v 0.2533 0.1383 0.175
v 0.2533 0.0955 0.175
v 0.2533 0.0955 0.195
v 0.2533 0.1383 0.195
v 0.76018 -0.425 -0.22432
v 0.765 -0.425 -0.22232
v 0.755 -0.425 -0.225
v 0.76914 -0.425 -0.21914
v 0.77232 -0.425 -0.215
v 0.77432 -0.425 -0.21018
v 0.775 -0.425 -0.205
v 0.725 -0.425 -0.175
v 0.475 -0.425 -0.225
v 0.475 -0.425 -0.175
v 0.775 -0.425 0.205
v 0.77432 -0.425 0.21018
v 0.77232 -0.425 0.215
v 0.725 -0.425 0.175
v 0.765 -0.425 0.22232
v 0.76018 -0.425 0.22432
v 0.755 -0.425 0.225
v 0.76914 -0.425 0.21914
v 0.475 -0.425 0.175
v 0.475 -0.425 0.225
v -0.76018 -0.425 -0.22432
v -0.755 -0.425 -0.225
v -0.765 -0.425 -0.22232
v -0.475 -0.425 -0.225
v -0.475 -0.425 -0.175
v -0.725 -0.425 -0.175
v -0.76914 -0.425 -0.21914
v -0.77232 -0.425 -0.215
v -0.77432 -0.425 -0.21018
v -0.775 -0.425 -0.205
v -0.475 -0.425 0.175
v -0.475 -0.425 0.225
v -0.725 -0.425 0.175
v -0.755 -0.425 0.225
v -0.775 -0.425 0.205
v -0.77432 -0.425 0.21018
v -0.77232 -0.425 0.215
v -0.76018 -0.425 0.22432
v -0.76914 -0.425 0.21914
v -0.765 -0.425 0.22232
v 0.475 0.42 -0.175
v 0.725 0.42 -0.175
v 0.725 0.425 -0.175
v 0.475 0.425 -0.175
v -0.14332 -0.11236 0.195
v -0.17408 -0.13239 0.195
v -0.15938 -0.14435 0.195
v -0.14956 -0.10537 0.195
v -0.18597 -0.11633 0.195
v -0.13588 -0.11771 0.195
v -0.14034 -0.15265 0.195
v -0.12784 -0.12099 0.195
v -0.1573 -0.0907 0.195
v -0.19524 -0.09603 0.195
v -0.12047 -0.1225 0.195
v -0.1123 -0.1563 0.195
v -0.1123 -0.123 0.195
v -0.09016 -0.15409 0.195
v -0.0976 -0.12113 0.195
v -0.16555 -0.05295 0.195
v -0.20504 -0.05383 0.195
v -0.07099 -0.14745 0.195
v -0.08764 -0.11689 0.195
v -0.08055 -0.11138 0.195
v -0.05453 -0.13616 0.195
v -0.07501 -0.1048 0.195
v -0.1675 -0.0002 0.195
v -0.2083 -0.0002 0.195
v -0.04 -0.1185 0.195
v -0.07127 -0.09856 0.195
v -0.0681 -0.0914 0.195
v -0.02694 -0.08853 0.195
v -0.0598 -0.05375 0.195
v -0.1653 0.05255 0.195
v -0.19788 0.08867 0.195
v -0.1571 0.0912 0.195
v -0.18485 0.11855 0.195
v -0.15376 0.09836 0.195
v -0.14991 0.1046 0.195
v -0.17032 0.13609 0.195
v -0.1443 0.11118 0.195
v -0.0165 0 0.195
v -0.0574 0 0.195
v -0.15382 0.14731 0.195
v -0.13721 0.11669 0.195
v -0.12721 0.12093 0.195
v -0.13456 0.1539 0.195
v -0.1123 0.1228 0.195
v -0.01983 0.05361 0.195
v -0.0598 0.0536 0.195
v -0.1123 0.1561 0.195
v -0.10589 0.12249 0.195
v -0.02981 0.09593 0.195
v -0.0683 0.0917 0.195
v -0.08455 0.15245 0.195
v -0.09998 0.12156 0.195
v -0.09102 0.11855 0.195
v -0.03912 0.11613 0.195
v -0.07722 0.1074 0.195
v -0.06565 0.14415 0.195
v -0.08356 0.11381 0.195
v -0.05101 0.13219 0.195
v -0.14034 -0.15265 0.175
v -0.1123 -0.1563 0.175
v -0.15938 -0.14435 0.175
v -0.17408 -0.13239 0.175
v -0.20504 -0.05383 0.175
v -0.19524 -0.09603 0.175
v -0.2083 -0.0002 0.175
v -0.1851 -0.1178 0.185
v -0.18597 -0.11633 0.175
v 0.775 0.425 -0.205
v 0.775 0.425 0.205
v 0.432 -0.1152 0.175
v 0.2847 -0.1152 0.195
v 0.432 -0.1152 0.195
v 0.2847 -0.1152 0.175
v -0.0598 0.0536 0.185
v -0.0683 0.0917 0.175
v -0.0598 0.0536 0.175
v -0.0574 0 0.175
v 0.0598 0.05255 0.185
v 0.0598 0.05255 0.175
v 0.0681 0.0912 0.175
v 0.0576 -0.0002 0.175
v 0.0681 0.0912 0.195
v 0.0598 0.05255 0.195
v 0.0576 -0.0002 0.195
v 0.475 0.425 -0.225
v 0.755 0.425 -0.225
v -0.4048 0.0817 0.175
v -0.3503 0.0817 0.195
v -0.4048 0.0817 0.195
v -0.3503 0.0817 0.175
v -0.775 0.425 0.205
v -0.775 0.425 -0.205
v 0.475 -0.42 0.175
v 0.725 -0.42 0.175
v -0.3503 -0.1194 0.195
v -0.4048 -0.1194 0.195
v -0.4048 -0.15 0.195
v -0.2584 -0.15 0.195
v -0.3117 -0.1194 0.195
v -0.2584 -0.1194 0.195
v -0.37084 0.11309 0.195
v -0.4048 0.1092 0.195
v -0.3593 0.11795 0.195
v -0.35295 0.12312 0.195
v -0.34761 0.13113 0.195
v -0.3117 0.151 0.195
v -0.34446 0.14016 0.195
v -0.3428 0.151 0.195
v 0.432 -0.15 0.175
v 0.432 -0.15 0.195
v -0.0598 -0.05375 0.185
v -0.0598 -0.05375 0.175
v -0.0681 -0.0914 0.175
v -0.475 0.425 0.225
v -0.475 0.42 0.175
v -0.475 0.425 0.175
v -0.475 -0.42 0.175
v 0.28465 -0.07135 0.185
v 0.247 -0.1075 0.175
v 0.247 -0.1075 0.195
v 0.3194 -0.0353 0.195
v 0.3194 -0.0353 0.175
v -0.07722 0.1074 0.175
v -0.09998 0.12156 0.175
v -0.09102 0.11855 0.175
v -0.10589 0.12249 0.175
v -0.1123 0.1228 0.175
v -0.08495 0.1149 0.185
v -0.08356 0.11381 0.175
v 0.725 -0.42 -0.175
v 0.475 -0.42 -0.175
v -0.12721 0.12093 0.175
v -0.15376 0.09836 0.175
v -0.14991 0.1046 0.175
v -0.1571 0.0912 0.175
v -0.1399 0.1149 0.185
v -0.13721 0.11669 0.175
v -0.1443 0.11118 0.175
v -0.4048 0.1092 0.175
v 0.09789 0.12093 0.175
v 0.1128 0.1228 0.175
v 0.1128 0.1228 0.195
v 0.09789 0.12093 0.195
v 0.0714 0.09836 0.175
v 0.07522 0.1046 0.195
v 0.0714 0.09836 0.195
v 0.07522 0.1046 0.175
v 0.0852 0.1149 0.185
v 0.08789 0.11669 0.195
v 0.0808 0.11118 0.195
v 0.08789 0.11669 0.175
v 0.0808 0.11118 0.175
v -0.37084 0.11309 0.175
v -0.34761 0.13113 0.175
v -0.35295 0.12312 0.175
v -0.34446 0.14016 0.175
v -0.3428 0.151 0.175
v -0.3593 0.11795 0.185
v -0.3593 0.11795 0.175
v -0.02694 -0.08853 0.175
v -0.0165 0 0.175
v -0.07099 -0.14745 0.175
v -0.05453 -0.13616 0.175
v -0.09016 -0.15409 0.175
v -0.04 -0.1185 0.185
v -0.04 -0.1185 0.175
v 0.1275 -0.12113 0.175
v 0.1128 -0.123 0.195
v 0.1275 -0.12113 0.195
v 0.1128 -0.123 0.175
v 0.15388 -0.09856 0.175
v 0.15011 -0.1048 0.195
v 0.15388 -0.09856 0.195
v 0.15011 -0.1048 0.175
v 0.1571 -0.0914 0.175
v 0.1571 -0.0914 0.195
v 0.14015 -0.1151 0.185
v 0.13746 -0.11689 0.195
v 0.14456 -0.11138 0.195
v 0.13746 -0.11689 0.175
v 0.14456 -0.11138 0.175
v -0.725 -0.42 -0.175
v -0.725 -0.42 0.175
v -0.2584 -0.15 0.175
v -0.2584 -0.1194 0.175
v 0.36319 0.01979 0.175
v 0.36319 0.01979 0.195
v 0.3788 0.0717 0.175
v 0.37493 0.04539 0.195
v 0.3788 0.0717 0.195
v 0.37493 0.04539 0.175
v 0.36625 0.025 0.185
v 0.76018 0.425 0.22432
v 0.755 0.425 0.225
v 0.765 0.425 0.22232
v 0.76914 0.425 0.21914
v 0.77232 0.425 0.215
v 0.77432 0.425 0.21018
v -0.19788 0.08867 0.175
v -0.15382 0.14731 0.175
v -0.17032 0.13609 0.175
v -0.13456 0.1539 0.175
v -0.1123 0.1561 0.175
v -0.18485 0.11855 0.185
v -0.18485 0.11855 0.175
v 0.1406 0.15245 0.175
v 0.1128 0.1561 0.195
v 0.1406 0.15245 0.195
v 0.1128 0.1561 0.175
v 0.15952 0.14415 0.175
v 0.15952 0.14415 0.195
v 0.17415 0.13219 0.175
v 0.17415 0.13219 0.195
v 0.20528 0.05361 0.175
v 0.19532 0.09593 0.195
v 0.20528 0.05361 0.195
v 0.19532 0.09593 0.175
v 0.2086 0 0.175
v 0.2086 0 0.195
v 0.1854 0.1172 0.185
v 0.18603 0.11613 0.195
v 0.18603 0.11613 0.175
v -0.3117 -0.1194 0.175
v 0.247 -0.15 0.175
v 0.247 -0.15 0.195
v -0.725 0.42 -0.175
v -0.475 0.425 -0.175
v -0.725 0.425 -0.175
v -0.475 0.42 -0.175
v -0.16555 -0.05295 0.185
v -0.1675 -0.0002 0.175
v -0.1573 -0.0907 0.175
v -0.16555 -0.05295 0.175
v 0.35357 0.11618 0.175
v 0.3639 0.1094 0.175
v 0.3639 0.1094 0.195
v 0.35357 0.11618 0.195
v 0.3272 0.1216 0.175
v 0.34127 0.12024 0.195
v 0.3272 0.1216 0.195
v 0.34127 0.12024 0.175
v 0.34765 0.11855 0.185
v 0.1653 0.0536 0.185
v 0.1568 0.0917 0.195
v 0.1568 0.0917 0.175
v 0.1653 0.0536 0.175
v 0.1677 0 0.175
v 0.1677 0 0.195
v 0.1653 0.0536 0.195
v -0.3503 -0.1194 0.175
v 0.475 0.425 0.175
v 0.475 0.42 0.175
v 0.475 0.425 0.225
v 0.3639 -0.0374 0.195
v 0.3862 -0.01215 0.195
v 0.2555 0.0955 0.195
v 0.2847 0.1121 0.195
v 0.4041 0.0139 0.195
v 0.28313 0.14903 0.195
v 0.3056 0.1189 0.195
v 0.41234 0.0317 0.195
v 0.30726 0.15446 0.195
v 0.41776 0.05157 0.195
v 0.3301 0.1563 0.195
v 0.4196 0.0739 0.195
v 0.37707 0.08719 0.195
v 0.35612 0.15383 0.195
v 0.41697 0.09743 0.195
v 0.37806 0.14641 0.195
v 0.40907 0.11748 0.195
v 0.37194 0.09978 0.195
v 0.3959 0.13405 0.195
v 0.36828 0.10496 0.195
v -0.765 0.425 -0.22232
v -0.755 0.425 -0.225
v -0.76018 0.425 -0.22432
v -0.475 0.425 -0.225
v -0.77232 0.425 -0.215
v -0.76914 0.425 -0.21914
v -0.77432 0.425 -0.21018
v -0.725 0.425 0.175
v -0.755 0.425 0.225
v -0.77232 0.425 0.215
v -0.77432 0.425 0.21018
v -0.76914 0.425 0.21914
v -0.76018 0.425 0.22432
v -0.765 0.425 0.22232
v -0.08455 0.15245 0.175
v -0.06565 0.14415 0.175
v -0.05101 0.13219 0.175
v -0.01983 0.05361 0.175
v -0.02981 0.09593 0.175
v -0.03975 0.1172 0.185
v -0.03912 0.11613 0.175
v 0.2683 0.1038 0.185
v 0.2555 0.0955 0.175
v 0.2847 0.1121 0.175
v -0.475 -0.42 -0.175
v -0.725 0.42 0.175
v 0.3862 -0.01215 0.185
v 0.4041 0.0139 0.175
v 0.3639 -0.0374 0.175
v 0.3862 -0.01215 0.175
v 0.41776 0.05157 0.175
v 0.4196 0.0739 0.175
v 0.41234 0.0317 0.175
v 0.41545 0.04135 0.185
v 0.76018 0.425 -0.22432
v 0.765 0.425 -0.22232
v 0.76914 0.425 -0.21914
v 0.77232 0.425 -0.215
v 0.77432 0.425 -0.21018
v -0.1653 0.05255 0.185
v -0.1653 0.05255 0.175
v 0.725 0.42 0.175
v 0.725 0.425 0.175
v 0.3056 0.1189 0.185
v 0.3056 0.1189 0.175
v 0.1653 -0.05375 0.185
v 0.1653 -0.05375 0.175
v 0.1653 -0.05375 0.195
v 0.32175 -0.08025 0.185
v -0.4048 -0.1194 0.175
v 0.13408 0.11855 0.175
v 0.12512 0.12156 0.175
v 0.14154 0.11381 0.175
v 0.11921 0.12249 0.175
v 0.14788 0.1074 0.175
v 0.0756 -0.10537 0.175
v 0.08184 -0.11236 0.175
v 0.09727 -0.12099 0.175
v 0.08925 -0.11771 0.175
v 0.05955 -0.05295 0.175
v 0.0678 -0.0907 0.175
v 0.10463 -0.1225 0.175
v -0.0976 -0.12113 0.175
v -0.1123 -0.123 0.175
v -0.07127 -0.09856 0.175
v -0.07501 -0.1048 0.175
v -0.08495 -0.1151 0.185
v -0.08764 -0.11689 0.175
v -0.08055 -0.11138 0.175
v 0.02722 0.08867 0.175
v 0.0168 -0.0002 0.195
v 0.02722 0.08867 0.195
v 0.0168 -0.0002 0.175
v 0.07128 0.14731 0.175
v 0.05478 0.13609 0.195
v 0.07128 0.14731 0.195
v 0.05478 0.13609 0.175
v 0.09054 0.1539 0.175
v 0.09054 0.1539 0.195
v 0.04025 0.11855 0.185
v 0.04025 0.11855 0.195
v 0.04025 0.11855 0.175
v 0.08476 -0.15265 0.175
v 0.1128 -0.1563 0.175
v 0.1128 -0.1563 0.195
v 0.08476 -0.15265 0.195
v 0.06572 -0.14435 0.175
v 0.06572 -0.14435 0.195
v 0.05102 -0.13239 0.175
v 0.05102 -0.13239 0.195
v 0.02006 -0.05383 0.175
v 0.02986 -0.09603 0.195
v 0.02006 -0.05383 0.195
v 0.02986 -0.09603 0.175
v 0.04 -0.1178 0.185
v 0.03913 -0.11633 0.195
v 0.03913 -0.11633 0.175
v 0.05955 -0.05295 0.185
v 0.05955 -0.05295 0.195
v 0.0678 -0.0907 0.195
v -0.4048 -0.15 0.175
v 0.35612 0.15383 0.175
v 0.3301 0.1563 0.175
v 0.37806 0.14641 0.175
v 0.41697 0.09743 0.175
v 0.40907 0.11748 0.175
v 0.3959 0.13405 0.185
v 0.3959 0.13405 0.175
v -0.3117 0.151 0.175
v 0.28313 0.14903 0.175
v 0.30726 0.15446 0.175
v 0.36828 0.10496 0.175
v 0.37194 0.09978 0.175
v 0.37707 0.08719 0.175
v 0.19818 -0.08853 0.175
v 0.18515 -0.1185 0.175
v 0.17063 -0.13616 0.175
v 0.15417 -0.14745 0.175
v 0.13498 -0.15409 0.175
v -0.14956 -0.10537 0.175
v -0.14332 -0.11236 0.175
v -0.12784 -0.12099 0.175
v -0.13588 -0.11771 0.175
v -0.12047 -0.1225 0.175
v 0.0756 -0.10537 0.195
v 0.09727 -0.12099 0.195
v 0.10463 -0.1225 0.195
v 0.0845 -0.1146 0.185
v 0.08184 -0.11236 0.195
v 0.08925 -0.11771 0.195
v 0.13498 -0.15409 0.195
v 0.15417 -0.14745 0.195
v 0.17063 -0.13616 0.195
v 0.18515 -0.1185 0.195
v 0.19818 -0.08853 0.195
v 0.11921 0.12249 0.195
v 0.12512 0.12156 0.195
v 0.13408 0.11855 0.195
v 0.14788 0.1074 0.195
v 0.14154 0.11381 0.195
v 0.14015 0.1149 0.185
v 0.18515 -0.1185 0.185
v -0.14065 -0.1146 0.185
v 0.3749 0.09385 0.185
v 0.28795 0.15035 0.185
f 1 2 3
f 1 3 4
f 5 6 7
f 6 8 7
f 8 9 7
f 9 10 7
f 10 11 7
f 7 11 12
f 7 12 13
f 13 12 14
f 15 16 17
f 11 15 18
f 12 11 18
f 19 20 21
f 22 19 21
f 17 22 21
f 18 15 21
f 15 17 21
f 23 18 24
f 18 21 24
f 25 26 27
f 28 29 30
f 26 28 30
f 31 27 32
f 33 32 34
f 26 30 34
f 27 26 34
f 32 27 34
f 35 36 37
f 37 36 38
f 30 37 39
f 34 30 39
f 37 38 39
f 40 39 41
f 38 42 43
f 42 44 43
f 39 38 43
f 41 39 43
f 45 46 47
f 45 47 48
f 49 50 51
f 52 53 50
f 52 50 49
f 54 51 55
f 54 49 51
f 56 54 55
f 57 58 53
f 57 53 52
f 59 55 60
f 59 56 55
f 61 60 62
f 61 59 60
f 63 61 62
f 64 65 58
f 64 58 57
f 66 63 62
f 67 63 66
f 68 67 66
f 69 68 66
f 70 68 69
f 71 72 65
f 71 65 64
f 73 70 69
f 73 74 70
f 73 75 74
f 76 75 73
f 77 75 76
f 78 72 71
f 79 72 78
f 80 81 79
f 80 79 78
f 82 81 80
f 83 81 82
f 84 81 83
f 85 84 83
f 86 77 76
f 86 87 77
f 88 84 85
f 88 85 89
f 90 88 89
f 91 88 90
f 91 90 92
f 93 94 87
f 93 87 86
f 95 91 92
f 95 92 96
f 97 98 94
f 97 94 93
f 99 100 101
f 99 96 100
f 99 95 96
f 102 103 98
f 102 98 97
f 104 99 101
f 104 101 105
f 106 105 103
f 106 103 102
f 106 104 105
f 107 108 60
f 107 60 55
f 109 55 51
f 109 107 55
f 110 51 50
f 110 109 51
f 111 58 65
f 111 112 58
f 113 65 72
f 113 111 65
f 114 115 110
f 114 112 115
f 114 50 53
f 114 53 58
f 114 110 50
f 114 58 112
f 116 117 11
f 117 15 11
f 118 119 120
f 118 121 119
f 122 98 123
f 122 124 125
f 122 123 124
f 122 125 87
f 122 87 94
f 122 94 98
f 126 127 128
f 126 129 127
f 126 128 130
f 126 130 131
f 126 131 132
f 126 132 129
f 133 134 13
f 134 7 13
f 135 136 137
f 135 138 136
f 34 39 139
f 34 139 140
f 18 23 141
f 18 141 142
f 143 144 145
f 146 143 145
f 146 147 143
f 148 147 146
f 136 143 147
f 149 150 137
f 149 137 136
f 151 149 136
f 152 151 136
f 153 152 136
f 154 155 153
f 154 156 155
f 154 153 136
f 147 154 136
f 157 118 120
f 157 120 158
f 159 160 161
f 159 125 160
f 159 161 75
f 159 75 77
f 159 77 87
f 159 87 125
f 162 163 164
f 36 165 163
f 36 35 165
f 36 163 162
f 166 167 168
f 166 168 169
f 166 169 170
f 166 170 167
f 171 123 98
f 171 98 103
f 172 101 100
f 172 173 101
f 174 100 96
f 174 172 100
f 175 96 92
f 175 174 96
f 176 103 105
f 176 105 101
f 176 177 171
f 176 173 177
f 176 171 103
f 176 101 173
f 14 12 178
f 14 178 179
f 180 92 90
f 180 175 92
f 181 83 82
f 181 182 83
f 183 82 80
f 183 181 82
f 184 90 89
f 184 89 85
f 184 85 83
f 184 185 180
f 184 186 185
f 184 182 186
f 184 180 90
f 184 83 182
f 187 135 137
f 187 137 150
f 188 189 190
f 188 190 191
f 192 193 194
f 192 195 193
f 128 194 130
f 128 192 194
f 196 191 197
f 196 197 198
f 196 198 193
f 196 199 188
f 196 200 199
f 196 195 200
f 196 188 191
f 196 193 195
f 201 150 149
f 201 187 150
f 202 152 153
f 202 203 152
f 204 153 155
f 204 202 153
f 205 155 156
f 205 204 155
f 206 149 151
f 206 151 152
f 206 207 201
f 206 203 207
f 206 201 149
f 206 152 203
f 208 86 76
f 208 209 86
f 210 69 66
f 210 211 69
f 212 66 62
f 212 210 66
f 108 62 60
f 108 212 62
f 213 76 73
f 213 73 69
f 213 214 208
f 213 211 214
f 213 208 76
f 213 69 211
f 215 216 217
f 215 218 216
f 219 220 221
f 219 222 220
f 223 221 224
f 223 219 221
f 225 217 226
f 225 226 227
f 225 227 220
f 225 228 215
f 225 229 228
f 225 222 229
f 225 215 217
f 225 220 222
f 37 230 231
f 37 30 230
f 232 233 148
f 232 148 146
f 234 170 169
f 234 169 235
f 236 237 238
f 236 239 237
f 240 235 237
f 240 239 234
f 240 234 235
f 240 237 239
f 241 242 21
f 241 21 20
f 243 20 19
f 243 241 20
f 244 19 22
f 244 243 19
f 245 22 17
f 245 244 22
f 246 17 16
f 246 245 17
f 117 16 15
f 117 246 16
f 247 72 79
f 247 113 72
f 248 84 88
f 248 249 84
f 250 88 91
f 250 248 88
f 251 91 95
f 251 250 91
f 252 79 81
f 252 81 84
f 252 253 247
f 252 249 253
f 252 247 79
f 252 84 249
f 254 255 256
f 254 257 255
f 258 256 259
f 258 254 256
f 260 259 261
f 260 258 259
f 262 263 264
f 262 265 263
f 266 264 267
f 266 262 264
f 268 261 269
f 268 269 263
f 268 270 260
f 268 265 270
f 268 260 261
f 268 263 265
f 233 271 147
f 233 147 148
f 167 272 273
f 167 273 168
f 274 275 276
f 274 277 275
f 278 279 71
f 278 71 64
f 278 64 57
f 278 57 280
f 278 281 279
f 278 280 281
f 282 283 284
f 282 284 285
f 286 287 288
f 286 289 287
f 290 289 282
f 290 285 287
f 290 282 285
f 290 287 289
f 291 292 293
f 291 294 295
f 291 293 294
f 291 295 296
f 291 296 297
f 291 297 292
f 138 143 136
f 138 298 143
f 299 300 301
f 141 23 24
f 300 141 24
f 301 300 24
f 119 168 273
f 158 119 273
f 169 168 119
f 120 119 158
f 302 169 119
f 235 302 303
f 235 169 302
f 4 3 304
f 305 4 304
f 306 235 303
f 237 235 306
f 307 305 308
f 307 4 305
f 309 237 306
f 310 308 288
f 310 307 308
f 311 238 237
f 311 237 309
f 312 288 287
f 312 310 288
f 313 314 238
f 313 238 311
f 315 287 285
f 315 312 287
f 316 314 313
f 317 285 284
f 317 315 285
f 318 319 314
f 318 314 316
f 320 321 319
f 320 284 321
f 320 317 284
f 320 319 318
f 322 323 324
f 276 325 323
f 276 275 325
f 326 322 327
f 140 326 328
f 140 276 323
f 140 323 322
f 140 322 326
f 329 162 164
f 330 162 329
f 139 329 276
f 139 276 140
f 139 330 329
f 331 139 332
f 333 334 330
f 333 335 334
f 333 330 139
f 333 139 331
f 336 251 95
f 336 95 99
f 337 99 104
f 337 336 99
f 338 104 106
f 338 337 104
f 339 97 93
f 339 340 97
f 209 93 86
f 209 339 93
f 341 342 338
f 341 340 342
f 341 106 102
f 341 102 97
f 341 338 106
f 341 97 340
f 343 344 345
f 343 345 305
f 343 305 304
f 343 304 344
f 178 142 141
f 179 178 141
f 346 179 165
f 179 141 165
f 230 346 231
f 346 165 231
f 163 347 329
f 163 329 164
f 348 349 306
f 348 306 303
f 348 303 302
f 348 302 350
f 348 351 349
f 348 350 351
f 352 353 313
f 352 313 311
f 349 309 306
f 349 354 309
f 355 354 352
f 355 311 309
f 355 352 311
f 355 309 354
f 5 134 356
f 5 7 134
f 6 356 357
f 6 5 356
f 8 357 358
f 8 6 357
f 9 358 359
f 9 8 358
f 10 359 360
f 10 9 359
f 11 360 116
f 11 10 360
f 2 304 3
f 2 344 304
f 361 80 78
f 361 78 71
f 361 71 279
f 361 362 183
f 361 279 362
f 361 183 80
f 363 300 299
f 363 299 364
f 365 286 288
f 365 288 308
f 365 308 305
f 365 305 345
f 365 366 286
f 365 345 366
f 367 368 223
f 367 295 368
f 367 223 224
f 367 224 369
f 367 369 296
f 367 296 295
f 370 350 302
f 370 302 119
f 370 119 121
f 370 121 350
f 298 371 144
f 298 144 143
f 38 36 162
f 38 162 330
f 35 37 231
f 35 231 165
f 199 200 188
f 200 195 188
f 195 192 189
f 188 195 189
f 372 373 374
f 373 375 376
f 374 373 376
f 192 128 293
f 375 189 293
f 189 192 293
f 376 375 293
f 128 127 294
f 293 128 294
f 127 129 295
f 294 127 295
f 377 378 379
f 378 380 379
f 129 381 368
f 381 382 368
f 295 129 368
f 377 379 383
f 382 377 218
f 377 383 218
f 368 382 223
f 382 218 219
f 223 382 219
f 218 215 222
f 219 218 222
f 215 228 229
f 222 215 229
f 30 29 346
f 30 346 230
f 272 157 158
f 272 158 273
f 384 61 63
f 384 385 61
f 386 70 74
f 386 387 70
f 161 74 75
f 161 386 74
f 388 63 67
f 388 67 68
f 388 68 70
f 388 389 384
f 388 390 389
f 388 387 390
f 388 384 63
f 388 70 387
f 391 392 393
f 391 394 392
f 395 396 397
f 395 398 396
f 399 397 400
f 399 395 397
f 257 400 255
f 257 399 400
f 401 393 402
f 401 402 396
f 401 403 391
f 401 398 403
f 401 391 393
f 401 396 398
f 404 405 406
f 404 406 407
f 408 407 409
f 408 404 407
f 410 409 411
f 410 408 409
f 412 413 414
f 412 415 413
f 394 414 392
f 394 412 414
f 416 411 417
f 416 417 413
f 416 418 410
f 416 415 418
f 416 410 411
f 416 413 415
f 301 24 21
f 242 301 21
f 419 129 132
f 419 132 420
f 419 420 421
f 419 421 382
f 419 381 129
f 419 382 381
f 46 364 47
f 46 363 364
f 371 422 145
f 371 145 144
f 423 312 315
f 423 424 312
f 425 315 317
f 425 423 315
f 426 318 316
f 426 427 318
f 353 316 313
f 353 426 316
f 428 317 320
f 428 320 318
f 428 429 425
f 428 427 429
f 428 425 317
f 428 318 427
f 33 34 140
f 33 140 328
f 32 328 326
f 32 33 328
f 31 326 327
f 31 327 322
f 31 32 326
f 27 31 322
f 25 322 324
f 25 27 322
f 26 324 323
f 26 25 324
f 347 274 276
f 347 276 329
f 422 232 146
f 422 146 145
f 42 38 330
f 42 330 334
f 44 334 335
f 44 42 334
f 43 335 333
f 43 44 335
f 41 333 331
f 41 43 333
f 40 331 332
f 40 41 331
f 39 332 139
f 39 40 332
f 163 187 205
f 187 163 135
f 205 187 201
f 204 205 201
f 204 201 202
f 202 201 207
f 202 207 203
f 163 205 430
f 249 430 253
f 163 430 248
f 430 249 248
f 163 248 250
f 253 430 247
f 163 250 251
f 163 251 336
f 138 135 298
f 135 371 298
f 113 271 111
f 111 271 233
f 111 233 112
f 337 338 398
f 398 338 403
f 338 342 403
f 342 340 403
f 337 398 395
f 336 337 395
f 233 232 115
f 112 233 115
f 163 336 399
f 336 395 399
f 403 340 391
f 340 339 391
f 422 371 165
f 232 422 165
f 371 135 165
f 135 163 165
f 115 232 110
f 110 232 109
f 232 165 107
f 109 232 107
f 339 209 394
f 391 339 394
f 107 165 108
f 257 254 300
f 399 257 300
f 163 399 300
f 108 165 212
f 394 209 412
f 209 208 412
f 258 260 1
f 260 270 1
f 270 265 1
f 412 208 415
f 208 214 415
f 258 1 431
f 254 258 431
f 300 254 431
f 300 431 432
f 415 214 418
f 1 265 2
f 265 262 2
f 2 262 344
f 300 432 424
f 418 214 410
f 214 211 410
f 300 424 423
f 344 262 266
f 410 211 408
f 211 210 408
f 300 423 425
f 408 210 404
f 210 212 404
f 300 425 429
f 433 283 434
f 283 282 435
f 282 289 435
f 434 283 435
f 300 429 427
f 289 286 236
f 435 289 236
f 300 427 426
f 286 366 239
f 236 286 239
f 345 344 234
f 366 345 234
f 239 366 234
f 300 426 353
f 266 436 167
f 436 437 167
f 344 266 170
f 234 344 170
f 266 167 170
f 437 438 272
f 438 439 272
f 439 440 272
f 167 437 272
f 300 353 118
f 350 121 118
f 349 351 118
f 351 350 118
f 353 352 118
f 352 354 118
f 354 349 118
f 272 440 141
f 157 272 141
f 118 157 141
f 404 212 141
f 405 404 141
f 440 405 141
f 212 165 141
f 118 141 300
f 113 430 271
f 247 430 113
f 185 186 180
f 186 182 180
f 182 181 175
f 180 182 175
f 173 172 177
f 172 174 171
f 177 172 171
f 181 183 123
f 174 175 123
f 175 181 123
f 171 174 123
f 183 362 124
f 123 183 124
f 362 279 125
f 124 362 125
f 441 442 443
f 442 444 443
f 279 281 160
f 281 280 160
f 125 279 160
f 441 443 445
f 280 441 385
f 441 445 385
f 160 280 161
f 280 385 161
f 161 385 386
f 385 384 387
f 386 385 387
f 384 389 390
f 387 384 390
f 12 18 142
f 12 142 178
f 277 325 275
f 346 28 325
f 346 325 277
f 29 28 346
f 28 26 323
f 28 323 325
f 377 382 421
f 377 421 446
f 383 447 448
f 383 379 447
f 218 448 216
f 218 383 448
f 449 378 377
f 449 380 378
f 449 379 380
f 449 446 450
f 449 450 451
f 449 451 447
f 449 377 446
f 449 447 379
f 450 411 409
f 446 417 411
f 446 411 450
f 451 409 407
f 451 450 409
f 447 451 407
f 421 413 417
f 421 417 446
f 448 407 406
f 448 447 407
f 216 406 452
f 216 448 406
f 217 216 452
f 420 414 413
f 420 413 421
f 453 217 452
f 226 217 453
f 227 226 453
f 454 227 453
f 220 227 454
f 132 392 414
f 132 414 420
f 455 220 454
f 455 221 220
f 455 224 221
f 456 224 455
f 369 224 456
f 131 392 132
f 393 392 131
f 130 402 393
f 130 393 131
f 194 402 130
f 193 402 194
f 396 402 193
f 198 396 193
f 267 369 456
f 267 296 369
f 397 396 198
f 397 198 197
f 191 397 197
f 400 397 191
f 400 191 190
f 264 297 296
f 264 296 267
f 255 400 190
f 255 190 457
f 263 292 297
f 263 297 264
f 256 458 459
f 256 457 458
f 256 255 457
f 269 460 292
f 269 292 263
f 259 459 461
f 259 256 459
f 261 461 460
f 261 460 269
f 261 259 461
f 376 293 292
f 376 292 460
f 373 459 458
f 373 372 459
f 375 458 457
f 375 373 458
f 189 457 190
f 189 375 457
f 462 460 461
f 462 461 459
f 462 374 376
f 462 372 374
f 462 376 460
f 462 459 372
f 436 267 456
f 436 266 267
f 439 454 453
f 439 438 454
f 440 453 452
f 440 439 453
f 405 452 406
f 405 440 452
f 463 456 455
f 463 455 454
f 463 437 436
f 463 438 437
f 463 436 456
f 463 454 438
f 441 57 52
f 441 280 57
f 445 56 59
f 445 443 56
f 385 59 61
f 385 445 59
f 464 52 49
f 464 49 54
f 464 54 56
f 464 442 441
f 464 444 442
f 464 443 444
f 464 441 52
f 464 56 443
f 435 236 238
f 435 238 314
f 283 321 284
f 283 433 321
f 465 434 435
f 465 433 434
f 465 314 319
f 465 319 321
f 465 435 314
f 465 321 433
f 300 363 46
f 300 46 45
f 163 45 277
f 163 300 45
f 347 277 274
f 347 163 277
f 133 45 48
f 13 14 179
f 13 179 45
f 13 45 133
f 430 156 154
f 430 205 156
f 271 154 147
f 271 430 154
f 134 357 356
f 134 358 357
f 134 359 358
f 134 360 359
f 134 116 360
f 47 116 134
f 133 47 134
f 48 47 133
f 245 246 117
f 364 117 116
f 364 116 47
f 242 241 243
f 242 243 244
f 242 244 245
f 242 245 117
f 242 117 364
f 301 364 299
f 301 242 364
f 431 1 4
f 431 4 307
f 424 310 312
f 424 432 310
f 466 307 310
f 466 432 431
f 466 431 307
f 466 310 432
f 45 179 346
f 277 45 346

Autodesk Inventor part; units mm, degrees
ref_plane "YZ Plane" through (0, 0, 0) normal (1, 0, 0) x (0, 1, 0)
ref_plane "XZ Plane" through (0, 0, 0) normal (0, 1, 0) x (-1, 0, 0)
ref_plane "XY Plane" through (0, 0, 0) normal (0, 0, 1) x (1, 0, 0)
sketch "Sketch1" plane through (0, 0, 0) normal (0, 1, 0) x (-1, 0, 0)
  line L0 (0.725, 0.175) -> (-0.725, 0.175)
  line L1 (-0.725, 0.175) -> (-0.725, -0.175)
  line L2 (-0.725, -0.175) -> (0.725, -0.175)
  line L3 (0.725, -0.175) -> (0.725, 0.175)
  line L4 (0.475, 0.175) -> (0.475, 0.225)
  line L5 (0.475, 0.225) -> (0.775, 0.225)
  line L6 (0.775, 0.225) -> (0.775, -0.225)
  line L7 (0.775, -0.225) -> (0.475, -0.225)
  line L8 (0.475, -0.225) -> (0.475, -0.175)
  line L9 (-0.475, 0.175) -> (-0.475, 0.225)
  line L10 (-0.475, 0.225) -> (-0.775, 0.225)
  line L11 (-0.775, 0.225) -> (-0.775, -0.225)
  line L12 (-0.775, -0.225) -> (-0.475, -0.225)
  line L13 (-0.475, -0.175) -> (-0.475, -0.225)
  line L14 (0.475, 0.175) -> (-0.475, 0.175)
  point P0 (0, 0)
  point P1 (0, 0.175)
  point P2 (0.725, 0)
  dimension "d0" = 1.55
  dimension "d1" = 0.05
  dimension "d2" = 0.05
  dimension "d3" = 0.45
  dimension "d4" = 0.3
extrude "Extrusion1" add sketch "Sketch1" along normal mid plane 0.85 contours L0 L4 L5 L6 L7 L8 L2 L3 | L0 L1 L2 L13 L12 L11 L10 L9
extrude "Extrusion2" add sketch "Sketch1" along normal mid plane 0.84 contours L3 L2 L1 L0
sketch "Sketch2" plane through (-0.475, -0.42, 0.175) normal (0, 0, 1) x (1, 0, 0)
  line L0 (0, 0) -> (0, 0.84) projected
  line L1 (0.95, 0) -> (0, 0) projected
  line L2 (0.95, 0) -> (0.95, 0.84) projected
  line L3 (0, 0.84) -> (0.95, 0.84) projected
  line L4 (0, 0.42) -> (0.95, 0.42) construction
  line L5 (0.2166, 0.27) -> (0.0702, 0.27)
  line L6 (0.0702, 0.27) -> (0.0702, 0.3006)
  line L7 (0.0702, 0.3006) -> (0.1247, 0.3006)
  line L8 (0.1247, 0.3006) -> (0.1247, 0.5017)
  line L9 (0.1247, 0.5017) -> (0.0702, 0.5017)
  line L10 (0.0702, 0.5017) -> (0.0702, 0.5292)
  spline S0 degree 2 poles (0.0702, 0.5292) (0.1011, 0.5292) (0.1303, 0.5467) (0.1322, 0.571) knots 0 0 0 1 2 2 2
  line L11 (0.1322, 0.571) -> (0.1633, 0.571)
  line L12 (0.1633, 0.571) -> (0.1633, 0.3006)
  line L13 (0.1633, 0.3006) -> (0.2166, 0.3006)
  line L14 (0.2166, 0.3006) -> (0.2166, 0.27)
  spline S1 degree 2 poles (0.4585, 0.42) (0.4585, 0.3393) (0.4115, 0.2637) (0.3627, 0.2637) knots 0 0 0 1 2 2 2
  spline S2 degree 2 poles (0.3627, 0.2637) (0.3131, 0.2637) (0.2667, 0.3407) (0.2667, 0.4198) knots 0 0 0 1 2 2 2
  spline S3 degree 2 poles (0.2667, 0.4198) (0.2667, 0.501) (0.3136, 0.5761) (0.3627, 0.5761) knots 0 0 0 1 2 2 2
  spline S4 degree 2 poles (0.3627, 0.5761) (0.412, 0.5761) (0.4585, 0.4983) (0.4585, 0.42) knots 0 0 0 1 2 2 2
  spline S5 degree 2 poles (0.4069, 0.3286) (0.4128, 0.3434) (0.4176, 0.3891) (0.4176, 0.42) knots 0 0 0 1 2 2 2
  spline S6 degree 2 poles (0.4176, 0.42) (0.4176, 0.4509) (0.4128, 0.4963) (0.4067, 0.5117) knots 0 0 0 1 2 2 2
  spline S7 degree 2 poles (0.4067, 0.5117) (0.4006, 0.527) (0.3795, 0.5428) (0.3627, 0.5428) knots 0 0 0 1 2 2 2
  spline S8 degree 2 poles (0.3627, 0.5428) (0.3459, 0.5428) (0.3243, 0.527) (0.3179, 0.5112) knots 0 0 0 1 2 2 2
  spline S9 degree 2 poles (0.3179, 0.5112) (0.3119, 0.4959) (0.3075, 0.4492) (0.3075, 0.4198) knots 0 0 0 1 2 2 2
  spline S10 degree 2 poles (0.3075, 0.4198) (0.3075, 0.3882) (0.3114, 0.3459) (0.3177, 0.3293) knots 0 0 0 1 2 2 2
  spline S11 degree 2 poles (0.3177, 0.3293) (0.3235, 0.3138) (0.3452, 0.297) (0.3627, 0.297) knots 0 0 0 1 2 2 2
  spline S12 degree 2 poles (0.3627, 0.297) (0.3792, 0.297) (0.4009, 0.3128) (0.4069, 0.3286) knots 0 0 0 1 2 2 2
  spline S13 degree 2 poles (0.6836, 0.42) (0.6836, 0.3393) (0.6367, 0.2637) (0.5878, 0.2637) knots 0 0 0 1 2 2 2
  spline S14 degree 2 poles (0.5878, 0.2637) (0.5382, 0.2637) (0.4918, 0.3407) (0.4918, 0.4198) knots 0 0 0 1 2 2 2
  spline S15 degree 2 poles (0.4918, 0.4198) (0.4918, 0.501) (0.5387, 0.5761) (0.5878, 0.5761) knots 0 0 0 1 2 2 2
  spline S16 degree 2 poles (0.5878, 0.5761) (0.6372, 0.5761) (0.6836, 0.4983) (0.6836, 0.42) knots 0 0 0 1 2 2 2
  spline S17 degree 2 poles (0.6321, 0.3286) (0.6379, 0.3434) (0.6427, 0.3891) (0.6427, 0.42) knots 0 0 0 1 2 2 2
  spline S18 degree 2 poles (0.6427, 0.42) (0.6427, 0.4509) (0.6379, 0.4963) (0.6318, 0.5117) knots 0 0 0 1 2 2 2
  spline S19 degree 2 poles (0.6318, 0.5117) (0.6257, 0.527) (0.6046, 0.5428) (0.5878, 0.5428) knots 0 0 0 1 2 2 2
  spline S20 degree 2 poles (0.5878, 0.5428) (0.571, 0.5428) (0.5494, 0.527) (0.5431, 0.5112) knots 0 0 0 1 2 2 2
  spline S21 degree 2 poles (0.5431, 0.5112) (0.537, 0.4959) (0.5326, 0.4492) (0.5326, 0.4198) knots 0 0 0 1 2 2 2
  spline S22 degree 2 poles (0.5326, 0.4198) (0.5326, 0.3882) (0.5365, 0.3459) (0.5428, 0.3293) knots 0 0 0 1 2 2 2
  spline S23 degree 2 poles (0.5428, 0.3293) (0.5487, 0.3138) (0.5703, 0.297) (0.5878, 0.297) knots 0 0 0 1 2 2 2
  spline S24 degree 2 poles (0.5878, 0.297) (0.6043, 0.297) (0.626, 0.3128) (0.6321, 0.3286) knots 0 0 0 1 2 2 2
  line L15 (0.907, 0.27) -> (0.722, 0.27)
  line L16 (0.722, 0.27) -> (0.722, 0.3125)
  spline S25 degree 2 poles (0.722, 0.3125) (0.7419, 0.3313) (0.7774, 0.366) (0.7944, 0.3847) knots 0 0 0 1 2 2 2
  spline S26 degree 2 poles (0.7944, 0.3847) (0.8287, 0.4224) (0.8538, 0.4676) (0.8538, 0.4917) knots 0 0 0 1 2 2 2
  spline S27 degree 2 poles (0.8538, 0.4917) (0.8538, 0.5044) (0.846, 0.5233) (0.8389, 0.5294) knots 0 0 0 1 2 2 2
  spline S28 degree 2 poles (0.8389, 0.5294) (0.8319, 0.5355) (0.8134, 0.5416) (0.8022, 0.5416) knots 0 0 0 1 2 2 2
  spline S29 degree 2 poles (0.8022, 0.5416) (0.7915, 0.5416) (0.7697, 0.5362) (0.7597, 0.5321) knots 0 0 0 1 2 2 2
  spline S30 degree 2 poles (0.7597, 0.5321) (0.7512, 0.5287) (0.7354, 0.5189) (0.7305, 0.5155) knots 0 0 0 1 2 2 2
  line L17 (0.7305, 0.5155) -> (0.7283, 0.5155)
  line L18 (0.7283, 0.5155) -> (0.7283, 0.5583)
  spline S31 degree 2 poles (0.7283, 0.5583) (0.7407, 0.5644) (0.7852, 0.5763) (0.8051, 0.5763) knots 0 0 0 1 2 2 2
  spline S32 degree 2 poles (0.8051, 0.5763) (0.8472, 0.5763) (0.8946, 0.5318) (0.8946, 0.4939) knots 0 0 0 1 2 2 2
  spline S33 degree 2 poles (0.8946, 0.4939) (0.8946, 0.4762) (0.8863, 0.4465) (0.8791, 0.4339) knots 0 0 0 1 2 2 2
  spline S34 degree 2 poles (0.8791, 0.4339) (0.8718, 0.4207) (0.8506, 0.395) (0.8389, 0.3826) knots 0 0 0 1 2 2 2
  spline S35 degree 2 poles (0.8389, 0.3826) (0.82, 0.3619) (0.7735, 0.3176) (0.7597, 0.3048) knots 0 0 0 1 2 2 2
  line L19 (0.7597, 0.3048) -> (0.907, 0.3048)
  line L20 (0.907, 0.3048) -> (0.907, 0.27)
  point P0 (0.475, 0.42)
extrude "Extrusion3" add sketch "Sketch2" along normal blind 0.02 contours L5 L6 L7 L8 L9 L10 S0 L11 L12 L13 L14 | S1 S2 S3 S4 | S13 S14 S15 S16 | L15 L16 S25 S26 S27 S28 S29 S30 L17 L18 S31 S32 S33 S34 S35 L19 L20
fillet "Fillet1" radius 0.02 4 edges at (-0.775, 0, 0.225) (-0.775, 0, -0.225) (0.775, 0, 0.225) (0.775, 0, -0.225)
equation "\"d2\" = d1"
properties part number "21-1001" material "Copper"
